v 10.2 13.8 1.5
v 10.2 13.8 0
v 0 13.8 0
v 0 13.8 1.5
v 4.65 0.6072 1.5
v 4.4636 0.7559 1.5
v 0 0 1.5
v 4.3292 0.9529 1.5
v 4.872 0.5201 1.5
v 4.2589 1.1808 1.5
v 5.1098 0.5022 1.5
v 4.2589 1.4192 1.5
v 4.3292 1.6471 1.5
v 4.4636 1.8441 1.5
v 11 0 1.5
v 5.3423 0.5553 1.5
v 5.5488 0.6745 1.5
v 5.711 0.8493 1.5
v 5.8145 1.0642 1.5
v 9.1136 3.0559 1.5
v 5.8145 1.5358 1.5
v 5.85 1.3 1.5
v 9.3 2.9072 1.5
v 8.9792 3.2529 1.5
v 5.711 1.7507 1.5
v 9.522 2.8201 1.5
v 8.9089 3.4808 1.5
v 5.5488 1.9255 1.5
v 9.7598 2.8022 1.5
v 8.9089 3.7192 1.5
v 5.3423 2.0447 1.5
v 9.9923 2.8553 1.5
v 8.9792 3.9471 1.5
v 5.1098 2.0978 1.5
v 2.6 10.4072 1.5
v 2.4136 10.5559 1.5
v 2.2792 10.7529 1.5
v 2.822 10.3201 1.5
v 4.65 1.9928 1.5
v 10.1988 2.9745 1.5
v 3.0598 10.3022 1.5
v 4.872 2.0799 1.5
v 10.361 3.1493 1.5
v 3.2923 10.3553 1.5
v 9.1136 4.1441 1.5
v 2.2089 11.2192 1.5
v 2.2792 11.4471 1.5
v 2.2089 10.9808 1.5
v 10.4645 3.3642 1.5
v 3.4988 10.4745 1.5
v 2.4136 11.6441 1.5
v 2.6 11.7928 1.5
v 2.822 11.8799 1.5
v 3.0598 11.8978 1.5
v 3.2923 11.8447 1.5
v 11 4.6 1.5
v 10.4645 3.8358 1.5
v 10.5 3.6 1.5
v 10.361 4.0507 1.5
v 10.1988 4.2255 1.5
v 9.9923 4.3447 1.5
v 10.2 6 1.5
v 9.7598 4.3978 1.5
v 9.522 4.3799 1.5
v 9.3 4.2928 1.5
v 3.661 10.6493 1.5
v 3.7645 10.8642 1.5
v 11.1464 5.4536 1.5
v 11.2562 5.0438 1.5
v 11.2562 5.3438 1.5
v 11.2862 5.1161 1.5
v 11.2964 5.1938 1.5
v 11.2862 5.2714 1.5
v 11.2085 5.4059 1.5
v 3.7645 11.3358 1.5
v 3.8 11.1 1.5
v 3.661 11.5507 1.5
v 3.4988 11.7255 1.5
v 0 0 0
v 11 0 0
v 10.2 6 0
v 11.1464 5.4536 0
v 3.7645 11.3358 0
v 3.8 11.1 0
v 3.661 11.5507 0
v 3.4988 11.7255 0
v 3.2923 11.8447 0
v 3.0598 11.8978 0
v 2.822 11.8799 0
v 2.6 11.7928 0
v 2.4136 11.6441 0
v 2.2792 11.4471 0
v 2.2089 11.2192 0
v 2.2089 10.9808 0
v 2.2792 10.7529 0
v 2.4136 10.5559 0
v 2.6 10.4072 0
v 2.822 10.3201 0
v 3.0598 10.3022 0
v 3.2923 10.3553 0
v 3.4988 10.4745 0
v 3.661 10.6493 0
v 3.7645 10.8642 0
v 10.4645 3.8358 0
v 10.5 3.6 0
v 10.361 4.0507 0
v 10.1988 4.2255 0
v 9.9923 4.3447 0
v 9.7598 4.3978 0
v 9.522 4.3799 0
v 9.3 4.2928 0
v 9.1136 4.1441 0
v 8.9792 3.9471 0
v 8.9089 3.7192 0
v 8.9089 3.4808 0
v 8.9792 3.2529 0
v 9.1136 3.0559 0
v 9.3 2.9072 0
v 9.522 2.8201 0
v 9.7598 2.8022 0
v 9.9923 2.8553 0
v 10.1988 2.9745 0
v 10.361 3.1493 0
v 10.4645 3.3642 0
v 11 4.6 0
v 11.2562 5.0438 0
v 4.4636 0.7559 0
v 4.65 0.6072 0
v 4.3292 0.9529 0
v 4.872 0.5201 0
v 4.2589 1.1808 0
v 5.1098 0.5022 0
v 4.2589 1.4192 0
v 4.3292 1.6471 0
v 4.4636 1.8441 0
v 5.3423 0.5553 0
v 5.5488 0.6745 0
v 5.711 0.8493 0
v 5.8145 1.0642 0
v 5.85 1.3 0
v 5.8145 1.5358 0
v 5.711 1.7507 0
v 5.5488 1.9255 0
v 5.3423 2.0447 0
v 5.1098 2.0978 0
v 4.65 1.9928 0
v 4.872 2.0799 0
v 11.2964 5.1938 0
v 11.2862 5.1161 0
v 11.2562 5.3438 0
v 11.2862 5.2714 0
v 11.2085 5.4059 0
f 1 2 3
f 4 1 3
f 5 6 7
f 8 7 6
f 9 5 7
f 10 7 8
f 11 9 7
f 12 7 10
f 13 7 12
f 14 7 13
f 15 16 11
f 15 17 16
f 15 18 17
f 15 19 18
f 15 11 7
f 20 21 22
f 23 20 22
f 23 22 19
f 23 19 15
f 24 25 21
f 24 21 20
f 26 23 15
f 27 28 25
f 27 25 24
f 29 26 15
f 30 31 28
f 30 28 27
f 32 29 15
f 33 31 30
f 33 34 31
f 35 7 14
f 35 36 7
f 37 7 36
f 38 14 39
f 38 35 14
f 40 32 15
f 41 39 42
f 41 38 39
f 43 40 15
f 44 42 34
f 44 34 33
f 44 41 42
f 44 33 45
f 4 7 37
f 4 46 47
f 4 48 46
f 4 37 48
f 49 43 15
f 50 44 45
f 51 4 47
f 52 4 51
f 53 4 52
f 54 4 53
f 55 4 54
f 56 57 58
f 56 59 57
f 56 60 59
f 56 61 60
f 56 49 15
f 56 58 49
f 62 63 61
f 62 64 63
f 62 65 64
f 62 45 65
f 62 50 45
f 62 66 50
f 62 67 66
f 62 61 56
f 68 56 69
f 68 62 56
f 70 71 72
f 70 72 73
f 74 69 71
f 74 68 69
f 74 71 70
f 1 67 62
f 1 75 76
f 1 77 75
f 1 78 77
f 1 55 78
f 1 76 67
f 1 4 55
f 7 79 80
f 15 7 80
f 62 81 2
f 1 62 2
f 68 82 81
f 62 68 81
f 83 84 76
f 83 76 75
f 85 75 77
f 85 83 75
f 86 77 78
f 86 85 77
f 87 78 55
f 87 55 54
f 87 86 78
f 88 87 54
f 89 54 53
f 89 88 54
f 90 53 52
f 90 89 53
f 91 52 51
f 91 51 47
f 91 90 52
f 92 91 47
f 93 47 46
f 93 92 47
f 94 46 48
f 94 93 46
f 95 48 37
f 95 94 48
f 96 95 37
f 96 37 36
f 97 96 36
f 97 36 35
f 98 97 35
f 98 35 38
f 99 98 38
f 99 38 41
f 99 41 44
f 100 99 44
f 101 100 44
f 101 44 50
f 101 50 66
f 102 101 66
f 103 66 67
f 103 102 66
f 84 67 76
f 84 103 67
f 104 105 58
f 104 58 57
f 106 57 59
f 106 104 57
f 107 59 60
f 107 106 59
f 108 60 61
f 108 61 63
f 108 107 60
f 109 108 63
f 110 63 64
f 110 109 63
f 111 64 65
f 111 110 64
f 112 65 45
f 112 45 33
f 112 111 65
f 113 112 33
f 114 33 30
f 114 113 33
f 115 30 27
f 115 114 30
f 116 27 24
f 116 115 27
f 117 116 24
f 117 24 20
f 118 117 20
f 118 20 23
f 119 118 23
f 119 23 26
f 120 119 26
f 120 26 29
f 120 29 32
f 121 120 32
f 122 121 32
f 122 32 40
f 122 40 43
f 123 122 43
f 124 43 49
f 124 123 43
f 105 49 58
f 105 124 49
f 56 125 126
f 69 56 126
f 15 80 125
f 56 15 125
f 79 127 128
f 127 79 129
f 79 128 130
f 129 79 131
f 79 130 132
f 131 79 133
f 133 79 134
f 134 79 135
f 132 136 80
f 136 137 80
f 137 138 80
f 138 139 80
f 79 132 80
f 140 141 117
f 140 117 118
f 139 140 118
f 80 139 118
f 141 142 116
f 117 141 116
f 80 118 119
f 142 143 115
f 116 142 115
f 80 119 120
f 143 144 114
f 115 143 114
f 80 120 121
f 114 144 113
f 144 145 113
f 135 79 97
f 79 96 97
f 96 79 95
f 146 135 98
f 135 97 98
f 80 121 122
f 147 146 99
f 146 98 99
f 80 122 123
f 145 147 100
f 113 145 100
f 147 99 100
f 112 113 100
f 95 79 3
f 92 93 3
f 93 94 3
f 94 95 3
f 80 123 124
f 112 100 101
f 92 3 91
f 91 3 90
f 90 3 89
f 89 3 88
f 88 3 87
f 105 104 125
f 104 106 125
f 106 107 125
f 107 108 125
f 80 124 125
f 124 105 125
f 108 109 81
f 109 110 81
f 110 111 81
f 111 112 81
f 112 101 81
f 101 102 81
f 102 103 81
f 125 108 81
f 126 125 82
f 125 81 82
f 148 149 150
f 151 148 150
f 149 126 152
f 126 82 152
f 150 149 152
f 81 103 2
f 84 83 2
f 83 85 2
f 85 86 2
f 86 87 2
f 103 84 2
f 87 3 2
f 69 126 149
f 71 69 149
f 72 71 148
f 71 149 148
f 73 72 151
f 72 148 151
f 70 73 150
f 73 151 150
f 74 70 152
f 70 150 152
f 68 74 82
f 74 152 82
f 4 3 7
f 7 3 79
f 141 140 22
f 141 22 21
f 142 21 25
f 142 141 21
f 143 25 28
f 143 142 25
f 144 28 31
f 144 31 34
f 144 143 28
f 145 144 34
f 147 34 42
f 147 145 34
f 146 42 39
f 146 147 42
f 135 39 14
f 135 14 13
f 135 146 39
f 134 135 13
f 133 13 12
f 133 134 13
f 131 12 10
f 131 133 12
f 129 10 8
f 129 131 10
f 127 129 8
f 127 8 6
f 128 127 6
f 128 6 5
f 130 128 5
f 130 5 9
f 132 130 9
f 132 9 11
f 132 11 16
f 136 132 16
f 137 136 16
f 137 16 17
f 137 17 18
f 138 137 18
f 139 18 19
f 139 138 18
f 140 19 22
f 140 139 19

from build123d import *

# Parameters (mm, degrees)
SKETCH_R  = 0.8
PAD_DEPTH = 1.5


with BuildPart() as part:
    # Sketch → Pad (new body)
    with BuildSketch(Plane.XY):
        with BuildLine():
            Line((0, 0), (11, 0))
            Line((11, 0), (11, 4.6))
            Line((11, 4.6), (11.256218, 5.043782))
            ThreePointArc((11.256218, 5.043782), (11.286188, 5.271428), (11.14641, 5.45359))
            Line((11.14641, 5.45359), (10.2, 6))
            Line((10.2, 6), (10.2, 13.8))
            Line((10.2, 13.8), (0, 13.8))
            Line((0, 13.8), (0, 0))
        make_face()
        with Locations((5.05, 1.3)):
            Circle(SKETCH_R, mode=Mode.SUBTRACT)
        with Locations((9.7, 3.6)):
            Circle(SKETCH_R, mode=Mode.SUBTRACT)
        with Locations((3, 11.1)):
            Circle(SKETCH_R, mode=Mode.SUBTRACT)
    extrude(amount=PAD_DEPTH)


solid = part.part
